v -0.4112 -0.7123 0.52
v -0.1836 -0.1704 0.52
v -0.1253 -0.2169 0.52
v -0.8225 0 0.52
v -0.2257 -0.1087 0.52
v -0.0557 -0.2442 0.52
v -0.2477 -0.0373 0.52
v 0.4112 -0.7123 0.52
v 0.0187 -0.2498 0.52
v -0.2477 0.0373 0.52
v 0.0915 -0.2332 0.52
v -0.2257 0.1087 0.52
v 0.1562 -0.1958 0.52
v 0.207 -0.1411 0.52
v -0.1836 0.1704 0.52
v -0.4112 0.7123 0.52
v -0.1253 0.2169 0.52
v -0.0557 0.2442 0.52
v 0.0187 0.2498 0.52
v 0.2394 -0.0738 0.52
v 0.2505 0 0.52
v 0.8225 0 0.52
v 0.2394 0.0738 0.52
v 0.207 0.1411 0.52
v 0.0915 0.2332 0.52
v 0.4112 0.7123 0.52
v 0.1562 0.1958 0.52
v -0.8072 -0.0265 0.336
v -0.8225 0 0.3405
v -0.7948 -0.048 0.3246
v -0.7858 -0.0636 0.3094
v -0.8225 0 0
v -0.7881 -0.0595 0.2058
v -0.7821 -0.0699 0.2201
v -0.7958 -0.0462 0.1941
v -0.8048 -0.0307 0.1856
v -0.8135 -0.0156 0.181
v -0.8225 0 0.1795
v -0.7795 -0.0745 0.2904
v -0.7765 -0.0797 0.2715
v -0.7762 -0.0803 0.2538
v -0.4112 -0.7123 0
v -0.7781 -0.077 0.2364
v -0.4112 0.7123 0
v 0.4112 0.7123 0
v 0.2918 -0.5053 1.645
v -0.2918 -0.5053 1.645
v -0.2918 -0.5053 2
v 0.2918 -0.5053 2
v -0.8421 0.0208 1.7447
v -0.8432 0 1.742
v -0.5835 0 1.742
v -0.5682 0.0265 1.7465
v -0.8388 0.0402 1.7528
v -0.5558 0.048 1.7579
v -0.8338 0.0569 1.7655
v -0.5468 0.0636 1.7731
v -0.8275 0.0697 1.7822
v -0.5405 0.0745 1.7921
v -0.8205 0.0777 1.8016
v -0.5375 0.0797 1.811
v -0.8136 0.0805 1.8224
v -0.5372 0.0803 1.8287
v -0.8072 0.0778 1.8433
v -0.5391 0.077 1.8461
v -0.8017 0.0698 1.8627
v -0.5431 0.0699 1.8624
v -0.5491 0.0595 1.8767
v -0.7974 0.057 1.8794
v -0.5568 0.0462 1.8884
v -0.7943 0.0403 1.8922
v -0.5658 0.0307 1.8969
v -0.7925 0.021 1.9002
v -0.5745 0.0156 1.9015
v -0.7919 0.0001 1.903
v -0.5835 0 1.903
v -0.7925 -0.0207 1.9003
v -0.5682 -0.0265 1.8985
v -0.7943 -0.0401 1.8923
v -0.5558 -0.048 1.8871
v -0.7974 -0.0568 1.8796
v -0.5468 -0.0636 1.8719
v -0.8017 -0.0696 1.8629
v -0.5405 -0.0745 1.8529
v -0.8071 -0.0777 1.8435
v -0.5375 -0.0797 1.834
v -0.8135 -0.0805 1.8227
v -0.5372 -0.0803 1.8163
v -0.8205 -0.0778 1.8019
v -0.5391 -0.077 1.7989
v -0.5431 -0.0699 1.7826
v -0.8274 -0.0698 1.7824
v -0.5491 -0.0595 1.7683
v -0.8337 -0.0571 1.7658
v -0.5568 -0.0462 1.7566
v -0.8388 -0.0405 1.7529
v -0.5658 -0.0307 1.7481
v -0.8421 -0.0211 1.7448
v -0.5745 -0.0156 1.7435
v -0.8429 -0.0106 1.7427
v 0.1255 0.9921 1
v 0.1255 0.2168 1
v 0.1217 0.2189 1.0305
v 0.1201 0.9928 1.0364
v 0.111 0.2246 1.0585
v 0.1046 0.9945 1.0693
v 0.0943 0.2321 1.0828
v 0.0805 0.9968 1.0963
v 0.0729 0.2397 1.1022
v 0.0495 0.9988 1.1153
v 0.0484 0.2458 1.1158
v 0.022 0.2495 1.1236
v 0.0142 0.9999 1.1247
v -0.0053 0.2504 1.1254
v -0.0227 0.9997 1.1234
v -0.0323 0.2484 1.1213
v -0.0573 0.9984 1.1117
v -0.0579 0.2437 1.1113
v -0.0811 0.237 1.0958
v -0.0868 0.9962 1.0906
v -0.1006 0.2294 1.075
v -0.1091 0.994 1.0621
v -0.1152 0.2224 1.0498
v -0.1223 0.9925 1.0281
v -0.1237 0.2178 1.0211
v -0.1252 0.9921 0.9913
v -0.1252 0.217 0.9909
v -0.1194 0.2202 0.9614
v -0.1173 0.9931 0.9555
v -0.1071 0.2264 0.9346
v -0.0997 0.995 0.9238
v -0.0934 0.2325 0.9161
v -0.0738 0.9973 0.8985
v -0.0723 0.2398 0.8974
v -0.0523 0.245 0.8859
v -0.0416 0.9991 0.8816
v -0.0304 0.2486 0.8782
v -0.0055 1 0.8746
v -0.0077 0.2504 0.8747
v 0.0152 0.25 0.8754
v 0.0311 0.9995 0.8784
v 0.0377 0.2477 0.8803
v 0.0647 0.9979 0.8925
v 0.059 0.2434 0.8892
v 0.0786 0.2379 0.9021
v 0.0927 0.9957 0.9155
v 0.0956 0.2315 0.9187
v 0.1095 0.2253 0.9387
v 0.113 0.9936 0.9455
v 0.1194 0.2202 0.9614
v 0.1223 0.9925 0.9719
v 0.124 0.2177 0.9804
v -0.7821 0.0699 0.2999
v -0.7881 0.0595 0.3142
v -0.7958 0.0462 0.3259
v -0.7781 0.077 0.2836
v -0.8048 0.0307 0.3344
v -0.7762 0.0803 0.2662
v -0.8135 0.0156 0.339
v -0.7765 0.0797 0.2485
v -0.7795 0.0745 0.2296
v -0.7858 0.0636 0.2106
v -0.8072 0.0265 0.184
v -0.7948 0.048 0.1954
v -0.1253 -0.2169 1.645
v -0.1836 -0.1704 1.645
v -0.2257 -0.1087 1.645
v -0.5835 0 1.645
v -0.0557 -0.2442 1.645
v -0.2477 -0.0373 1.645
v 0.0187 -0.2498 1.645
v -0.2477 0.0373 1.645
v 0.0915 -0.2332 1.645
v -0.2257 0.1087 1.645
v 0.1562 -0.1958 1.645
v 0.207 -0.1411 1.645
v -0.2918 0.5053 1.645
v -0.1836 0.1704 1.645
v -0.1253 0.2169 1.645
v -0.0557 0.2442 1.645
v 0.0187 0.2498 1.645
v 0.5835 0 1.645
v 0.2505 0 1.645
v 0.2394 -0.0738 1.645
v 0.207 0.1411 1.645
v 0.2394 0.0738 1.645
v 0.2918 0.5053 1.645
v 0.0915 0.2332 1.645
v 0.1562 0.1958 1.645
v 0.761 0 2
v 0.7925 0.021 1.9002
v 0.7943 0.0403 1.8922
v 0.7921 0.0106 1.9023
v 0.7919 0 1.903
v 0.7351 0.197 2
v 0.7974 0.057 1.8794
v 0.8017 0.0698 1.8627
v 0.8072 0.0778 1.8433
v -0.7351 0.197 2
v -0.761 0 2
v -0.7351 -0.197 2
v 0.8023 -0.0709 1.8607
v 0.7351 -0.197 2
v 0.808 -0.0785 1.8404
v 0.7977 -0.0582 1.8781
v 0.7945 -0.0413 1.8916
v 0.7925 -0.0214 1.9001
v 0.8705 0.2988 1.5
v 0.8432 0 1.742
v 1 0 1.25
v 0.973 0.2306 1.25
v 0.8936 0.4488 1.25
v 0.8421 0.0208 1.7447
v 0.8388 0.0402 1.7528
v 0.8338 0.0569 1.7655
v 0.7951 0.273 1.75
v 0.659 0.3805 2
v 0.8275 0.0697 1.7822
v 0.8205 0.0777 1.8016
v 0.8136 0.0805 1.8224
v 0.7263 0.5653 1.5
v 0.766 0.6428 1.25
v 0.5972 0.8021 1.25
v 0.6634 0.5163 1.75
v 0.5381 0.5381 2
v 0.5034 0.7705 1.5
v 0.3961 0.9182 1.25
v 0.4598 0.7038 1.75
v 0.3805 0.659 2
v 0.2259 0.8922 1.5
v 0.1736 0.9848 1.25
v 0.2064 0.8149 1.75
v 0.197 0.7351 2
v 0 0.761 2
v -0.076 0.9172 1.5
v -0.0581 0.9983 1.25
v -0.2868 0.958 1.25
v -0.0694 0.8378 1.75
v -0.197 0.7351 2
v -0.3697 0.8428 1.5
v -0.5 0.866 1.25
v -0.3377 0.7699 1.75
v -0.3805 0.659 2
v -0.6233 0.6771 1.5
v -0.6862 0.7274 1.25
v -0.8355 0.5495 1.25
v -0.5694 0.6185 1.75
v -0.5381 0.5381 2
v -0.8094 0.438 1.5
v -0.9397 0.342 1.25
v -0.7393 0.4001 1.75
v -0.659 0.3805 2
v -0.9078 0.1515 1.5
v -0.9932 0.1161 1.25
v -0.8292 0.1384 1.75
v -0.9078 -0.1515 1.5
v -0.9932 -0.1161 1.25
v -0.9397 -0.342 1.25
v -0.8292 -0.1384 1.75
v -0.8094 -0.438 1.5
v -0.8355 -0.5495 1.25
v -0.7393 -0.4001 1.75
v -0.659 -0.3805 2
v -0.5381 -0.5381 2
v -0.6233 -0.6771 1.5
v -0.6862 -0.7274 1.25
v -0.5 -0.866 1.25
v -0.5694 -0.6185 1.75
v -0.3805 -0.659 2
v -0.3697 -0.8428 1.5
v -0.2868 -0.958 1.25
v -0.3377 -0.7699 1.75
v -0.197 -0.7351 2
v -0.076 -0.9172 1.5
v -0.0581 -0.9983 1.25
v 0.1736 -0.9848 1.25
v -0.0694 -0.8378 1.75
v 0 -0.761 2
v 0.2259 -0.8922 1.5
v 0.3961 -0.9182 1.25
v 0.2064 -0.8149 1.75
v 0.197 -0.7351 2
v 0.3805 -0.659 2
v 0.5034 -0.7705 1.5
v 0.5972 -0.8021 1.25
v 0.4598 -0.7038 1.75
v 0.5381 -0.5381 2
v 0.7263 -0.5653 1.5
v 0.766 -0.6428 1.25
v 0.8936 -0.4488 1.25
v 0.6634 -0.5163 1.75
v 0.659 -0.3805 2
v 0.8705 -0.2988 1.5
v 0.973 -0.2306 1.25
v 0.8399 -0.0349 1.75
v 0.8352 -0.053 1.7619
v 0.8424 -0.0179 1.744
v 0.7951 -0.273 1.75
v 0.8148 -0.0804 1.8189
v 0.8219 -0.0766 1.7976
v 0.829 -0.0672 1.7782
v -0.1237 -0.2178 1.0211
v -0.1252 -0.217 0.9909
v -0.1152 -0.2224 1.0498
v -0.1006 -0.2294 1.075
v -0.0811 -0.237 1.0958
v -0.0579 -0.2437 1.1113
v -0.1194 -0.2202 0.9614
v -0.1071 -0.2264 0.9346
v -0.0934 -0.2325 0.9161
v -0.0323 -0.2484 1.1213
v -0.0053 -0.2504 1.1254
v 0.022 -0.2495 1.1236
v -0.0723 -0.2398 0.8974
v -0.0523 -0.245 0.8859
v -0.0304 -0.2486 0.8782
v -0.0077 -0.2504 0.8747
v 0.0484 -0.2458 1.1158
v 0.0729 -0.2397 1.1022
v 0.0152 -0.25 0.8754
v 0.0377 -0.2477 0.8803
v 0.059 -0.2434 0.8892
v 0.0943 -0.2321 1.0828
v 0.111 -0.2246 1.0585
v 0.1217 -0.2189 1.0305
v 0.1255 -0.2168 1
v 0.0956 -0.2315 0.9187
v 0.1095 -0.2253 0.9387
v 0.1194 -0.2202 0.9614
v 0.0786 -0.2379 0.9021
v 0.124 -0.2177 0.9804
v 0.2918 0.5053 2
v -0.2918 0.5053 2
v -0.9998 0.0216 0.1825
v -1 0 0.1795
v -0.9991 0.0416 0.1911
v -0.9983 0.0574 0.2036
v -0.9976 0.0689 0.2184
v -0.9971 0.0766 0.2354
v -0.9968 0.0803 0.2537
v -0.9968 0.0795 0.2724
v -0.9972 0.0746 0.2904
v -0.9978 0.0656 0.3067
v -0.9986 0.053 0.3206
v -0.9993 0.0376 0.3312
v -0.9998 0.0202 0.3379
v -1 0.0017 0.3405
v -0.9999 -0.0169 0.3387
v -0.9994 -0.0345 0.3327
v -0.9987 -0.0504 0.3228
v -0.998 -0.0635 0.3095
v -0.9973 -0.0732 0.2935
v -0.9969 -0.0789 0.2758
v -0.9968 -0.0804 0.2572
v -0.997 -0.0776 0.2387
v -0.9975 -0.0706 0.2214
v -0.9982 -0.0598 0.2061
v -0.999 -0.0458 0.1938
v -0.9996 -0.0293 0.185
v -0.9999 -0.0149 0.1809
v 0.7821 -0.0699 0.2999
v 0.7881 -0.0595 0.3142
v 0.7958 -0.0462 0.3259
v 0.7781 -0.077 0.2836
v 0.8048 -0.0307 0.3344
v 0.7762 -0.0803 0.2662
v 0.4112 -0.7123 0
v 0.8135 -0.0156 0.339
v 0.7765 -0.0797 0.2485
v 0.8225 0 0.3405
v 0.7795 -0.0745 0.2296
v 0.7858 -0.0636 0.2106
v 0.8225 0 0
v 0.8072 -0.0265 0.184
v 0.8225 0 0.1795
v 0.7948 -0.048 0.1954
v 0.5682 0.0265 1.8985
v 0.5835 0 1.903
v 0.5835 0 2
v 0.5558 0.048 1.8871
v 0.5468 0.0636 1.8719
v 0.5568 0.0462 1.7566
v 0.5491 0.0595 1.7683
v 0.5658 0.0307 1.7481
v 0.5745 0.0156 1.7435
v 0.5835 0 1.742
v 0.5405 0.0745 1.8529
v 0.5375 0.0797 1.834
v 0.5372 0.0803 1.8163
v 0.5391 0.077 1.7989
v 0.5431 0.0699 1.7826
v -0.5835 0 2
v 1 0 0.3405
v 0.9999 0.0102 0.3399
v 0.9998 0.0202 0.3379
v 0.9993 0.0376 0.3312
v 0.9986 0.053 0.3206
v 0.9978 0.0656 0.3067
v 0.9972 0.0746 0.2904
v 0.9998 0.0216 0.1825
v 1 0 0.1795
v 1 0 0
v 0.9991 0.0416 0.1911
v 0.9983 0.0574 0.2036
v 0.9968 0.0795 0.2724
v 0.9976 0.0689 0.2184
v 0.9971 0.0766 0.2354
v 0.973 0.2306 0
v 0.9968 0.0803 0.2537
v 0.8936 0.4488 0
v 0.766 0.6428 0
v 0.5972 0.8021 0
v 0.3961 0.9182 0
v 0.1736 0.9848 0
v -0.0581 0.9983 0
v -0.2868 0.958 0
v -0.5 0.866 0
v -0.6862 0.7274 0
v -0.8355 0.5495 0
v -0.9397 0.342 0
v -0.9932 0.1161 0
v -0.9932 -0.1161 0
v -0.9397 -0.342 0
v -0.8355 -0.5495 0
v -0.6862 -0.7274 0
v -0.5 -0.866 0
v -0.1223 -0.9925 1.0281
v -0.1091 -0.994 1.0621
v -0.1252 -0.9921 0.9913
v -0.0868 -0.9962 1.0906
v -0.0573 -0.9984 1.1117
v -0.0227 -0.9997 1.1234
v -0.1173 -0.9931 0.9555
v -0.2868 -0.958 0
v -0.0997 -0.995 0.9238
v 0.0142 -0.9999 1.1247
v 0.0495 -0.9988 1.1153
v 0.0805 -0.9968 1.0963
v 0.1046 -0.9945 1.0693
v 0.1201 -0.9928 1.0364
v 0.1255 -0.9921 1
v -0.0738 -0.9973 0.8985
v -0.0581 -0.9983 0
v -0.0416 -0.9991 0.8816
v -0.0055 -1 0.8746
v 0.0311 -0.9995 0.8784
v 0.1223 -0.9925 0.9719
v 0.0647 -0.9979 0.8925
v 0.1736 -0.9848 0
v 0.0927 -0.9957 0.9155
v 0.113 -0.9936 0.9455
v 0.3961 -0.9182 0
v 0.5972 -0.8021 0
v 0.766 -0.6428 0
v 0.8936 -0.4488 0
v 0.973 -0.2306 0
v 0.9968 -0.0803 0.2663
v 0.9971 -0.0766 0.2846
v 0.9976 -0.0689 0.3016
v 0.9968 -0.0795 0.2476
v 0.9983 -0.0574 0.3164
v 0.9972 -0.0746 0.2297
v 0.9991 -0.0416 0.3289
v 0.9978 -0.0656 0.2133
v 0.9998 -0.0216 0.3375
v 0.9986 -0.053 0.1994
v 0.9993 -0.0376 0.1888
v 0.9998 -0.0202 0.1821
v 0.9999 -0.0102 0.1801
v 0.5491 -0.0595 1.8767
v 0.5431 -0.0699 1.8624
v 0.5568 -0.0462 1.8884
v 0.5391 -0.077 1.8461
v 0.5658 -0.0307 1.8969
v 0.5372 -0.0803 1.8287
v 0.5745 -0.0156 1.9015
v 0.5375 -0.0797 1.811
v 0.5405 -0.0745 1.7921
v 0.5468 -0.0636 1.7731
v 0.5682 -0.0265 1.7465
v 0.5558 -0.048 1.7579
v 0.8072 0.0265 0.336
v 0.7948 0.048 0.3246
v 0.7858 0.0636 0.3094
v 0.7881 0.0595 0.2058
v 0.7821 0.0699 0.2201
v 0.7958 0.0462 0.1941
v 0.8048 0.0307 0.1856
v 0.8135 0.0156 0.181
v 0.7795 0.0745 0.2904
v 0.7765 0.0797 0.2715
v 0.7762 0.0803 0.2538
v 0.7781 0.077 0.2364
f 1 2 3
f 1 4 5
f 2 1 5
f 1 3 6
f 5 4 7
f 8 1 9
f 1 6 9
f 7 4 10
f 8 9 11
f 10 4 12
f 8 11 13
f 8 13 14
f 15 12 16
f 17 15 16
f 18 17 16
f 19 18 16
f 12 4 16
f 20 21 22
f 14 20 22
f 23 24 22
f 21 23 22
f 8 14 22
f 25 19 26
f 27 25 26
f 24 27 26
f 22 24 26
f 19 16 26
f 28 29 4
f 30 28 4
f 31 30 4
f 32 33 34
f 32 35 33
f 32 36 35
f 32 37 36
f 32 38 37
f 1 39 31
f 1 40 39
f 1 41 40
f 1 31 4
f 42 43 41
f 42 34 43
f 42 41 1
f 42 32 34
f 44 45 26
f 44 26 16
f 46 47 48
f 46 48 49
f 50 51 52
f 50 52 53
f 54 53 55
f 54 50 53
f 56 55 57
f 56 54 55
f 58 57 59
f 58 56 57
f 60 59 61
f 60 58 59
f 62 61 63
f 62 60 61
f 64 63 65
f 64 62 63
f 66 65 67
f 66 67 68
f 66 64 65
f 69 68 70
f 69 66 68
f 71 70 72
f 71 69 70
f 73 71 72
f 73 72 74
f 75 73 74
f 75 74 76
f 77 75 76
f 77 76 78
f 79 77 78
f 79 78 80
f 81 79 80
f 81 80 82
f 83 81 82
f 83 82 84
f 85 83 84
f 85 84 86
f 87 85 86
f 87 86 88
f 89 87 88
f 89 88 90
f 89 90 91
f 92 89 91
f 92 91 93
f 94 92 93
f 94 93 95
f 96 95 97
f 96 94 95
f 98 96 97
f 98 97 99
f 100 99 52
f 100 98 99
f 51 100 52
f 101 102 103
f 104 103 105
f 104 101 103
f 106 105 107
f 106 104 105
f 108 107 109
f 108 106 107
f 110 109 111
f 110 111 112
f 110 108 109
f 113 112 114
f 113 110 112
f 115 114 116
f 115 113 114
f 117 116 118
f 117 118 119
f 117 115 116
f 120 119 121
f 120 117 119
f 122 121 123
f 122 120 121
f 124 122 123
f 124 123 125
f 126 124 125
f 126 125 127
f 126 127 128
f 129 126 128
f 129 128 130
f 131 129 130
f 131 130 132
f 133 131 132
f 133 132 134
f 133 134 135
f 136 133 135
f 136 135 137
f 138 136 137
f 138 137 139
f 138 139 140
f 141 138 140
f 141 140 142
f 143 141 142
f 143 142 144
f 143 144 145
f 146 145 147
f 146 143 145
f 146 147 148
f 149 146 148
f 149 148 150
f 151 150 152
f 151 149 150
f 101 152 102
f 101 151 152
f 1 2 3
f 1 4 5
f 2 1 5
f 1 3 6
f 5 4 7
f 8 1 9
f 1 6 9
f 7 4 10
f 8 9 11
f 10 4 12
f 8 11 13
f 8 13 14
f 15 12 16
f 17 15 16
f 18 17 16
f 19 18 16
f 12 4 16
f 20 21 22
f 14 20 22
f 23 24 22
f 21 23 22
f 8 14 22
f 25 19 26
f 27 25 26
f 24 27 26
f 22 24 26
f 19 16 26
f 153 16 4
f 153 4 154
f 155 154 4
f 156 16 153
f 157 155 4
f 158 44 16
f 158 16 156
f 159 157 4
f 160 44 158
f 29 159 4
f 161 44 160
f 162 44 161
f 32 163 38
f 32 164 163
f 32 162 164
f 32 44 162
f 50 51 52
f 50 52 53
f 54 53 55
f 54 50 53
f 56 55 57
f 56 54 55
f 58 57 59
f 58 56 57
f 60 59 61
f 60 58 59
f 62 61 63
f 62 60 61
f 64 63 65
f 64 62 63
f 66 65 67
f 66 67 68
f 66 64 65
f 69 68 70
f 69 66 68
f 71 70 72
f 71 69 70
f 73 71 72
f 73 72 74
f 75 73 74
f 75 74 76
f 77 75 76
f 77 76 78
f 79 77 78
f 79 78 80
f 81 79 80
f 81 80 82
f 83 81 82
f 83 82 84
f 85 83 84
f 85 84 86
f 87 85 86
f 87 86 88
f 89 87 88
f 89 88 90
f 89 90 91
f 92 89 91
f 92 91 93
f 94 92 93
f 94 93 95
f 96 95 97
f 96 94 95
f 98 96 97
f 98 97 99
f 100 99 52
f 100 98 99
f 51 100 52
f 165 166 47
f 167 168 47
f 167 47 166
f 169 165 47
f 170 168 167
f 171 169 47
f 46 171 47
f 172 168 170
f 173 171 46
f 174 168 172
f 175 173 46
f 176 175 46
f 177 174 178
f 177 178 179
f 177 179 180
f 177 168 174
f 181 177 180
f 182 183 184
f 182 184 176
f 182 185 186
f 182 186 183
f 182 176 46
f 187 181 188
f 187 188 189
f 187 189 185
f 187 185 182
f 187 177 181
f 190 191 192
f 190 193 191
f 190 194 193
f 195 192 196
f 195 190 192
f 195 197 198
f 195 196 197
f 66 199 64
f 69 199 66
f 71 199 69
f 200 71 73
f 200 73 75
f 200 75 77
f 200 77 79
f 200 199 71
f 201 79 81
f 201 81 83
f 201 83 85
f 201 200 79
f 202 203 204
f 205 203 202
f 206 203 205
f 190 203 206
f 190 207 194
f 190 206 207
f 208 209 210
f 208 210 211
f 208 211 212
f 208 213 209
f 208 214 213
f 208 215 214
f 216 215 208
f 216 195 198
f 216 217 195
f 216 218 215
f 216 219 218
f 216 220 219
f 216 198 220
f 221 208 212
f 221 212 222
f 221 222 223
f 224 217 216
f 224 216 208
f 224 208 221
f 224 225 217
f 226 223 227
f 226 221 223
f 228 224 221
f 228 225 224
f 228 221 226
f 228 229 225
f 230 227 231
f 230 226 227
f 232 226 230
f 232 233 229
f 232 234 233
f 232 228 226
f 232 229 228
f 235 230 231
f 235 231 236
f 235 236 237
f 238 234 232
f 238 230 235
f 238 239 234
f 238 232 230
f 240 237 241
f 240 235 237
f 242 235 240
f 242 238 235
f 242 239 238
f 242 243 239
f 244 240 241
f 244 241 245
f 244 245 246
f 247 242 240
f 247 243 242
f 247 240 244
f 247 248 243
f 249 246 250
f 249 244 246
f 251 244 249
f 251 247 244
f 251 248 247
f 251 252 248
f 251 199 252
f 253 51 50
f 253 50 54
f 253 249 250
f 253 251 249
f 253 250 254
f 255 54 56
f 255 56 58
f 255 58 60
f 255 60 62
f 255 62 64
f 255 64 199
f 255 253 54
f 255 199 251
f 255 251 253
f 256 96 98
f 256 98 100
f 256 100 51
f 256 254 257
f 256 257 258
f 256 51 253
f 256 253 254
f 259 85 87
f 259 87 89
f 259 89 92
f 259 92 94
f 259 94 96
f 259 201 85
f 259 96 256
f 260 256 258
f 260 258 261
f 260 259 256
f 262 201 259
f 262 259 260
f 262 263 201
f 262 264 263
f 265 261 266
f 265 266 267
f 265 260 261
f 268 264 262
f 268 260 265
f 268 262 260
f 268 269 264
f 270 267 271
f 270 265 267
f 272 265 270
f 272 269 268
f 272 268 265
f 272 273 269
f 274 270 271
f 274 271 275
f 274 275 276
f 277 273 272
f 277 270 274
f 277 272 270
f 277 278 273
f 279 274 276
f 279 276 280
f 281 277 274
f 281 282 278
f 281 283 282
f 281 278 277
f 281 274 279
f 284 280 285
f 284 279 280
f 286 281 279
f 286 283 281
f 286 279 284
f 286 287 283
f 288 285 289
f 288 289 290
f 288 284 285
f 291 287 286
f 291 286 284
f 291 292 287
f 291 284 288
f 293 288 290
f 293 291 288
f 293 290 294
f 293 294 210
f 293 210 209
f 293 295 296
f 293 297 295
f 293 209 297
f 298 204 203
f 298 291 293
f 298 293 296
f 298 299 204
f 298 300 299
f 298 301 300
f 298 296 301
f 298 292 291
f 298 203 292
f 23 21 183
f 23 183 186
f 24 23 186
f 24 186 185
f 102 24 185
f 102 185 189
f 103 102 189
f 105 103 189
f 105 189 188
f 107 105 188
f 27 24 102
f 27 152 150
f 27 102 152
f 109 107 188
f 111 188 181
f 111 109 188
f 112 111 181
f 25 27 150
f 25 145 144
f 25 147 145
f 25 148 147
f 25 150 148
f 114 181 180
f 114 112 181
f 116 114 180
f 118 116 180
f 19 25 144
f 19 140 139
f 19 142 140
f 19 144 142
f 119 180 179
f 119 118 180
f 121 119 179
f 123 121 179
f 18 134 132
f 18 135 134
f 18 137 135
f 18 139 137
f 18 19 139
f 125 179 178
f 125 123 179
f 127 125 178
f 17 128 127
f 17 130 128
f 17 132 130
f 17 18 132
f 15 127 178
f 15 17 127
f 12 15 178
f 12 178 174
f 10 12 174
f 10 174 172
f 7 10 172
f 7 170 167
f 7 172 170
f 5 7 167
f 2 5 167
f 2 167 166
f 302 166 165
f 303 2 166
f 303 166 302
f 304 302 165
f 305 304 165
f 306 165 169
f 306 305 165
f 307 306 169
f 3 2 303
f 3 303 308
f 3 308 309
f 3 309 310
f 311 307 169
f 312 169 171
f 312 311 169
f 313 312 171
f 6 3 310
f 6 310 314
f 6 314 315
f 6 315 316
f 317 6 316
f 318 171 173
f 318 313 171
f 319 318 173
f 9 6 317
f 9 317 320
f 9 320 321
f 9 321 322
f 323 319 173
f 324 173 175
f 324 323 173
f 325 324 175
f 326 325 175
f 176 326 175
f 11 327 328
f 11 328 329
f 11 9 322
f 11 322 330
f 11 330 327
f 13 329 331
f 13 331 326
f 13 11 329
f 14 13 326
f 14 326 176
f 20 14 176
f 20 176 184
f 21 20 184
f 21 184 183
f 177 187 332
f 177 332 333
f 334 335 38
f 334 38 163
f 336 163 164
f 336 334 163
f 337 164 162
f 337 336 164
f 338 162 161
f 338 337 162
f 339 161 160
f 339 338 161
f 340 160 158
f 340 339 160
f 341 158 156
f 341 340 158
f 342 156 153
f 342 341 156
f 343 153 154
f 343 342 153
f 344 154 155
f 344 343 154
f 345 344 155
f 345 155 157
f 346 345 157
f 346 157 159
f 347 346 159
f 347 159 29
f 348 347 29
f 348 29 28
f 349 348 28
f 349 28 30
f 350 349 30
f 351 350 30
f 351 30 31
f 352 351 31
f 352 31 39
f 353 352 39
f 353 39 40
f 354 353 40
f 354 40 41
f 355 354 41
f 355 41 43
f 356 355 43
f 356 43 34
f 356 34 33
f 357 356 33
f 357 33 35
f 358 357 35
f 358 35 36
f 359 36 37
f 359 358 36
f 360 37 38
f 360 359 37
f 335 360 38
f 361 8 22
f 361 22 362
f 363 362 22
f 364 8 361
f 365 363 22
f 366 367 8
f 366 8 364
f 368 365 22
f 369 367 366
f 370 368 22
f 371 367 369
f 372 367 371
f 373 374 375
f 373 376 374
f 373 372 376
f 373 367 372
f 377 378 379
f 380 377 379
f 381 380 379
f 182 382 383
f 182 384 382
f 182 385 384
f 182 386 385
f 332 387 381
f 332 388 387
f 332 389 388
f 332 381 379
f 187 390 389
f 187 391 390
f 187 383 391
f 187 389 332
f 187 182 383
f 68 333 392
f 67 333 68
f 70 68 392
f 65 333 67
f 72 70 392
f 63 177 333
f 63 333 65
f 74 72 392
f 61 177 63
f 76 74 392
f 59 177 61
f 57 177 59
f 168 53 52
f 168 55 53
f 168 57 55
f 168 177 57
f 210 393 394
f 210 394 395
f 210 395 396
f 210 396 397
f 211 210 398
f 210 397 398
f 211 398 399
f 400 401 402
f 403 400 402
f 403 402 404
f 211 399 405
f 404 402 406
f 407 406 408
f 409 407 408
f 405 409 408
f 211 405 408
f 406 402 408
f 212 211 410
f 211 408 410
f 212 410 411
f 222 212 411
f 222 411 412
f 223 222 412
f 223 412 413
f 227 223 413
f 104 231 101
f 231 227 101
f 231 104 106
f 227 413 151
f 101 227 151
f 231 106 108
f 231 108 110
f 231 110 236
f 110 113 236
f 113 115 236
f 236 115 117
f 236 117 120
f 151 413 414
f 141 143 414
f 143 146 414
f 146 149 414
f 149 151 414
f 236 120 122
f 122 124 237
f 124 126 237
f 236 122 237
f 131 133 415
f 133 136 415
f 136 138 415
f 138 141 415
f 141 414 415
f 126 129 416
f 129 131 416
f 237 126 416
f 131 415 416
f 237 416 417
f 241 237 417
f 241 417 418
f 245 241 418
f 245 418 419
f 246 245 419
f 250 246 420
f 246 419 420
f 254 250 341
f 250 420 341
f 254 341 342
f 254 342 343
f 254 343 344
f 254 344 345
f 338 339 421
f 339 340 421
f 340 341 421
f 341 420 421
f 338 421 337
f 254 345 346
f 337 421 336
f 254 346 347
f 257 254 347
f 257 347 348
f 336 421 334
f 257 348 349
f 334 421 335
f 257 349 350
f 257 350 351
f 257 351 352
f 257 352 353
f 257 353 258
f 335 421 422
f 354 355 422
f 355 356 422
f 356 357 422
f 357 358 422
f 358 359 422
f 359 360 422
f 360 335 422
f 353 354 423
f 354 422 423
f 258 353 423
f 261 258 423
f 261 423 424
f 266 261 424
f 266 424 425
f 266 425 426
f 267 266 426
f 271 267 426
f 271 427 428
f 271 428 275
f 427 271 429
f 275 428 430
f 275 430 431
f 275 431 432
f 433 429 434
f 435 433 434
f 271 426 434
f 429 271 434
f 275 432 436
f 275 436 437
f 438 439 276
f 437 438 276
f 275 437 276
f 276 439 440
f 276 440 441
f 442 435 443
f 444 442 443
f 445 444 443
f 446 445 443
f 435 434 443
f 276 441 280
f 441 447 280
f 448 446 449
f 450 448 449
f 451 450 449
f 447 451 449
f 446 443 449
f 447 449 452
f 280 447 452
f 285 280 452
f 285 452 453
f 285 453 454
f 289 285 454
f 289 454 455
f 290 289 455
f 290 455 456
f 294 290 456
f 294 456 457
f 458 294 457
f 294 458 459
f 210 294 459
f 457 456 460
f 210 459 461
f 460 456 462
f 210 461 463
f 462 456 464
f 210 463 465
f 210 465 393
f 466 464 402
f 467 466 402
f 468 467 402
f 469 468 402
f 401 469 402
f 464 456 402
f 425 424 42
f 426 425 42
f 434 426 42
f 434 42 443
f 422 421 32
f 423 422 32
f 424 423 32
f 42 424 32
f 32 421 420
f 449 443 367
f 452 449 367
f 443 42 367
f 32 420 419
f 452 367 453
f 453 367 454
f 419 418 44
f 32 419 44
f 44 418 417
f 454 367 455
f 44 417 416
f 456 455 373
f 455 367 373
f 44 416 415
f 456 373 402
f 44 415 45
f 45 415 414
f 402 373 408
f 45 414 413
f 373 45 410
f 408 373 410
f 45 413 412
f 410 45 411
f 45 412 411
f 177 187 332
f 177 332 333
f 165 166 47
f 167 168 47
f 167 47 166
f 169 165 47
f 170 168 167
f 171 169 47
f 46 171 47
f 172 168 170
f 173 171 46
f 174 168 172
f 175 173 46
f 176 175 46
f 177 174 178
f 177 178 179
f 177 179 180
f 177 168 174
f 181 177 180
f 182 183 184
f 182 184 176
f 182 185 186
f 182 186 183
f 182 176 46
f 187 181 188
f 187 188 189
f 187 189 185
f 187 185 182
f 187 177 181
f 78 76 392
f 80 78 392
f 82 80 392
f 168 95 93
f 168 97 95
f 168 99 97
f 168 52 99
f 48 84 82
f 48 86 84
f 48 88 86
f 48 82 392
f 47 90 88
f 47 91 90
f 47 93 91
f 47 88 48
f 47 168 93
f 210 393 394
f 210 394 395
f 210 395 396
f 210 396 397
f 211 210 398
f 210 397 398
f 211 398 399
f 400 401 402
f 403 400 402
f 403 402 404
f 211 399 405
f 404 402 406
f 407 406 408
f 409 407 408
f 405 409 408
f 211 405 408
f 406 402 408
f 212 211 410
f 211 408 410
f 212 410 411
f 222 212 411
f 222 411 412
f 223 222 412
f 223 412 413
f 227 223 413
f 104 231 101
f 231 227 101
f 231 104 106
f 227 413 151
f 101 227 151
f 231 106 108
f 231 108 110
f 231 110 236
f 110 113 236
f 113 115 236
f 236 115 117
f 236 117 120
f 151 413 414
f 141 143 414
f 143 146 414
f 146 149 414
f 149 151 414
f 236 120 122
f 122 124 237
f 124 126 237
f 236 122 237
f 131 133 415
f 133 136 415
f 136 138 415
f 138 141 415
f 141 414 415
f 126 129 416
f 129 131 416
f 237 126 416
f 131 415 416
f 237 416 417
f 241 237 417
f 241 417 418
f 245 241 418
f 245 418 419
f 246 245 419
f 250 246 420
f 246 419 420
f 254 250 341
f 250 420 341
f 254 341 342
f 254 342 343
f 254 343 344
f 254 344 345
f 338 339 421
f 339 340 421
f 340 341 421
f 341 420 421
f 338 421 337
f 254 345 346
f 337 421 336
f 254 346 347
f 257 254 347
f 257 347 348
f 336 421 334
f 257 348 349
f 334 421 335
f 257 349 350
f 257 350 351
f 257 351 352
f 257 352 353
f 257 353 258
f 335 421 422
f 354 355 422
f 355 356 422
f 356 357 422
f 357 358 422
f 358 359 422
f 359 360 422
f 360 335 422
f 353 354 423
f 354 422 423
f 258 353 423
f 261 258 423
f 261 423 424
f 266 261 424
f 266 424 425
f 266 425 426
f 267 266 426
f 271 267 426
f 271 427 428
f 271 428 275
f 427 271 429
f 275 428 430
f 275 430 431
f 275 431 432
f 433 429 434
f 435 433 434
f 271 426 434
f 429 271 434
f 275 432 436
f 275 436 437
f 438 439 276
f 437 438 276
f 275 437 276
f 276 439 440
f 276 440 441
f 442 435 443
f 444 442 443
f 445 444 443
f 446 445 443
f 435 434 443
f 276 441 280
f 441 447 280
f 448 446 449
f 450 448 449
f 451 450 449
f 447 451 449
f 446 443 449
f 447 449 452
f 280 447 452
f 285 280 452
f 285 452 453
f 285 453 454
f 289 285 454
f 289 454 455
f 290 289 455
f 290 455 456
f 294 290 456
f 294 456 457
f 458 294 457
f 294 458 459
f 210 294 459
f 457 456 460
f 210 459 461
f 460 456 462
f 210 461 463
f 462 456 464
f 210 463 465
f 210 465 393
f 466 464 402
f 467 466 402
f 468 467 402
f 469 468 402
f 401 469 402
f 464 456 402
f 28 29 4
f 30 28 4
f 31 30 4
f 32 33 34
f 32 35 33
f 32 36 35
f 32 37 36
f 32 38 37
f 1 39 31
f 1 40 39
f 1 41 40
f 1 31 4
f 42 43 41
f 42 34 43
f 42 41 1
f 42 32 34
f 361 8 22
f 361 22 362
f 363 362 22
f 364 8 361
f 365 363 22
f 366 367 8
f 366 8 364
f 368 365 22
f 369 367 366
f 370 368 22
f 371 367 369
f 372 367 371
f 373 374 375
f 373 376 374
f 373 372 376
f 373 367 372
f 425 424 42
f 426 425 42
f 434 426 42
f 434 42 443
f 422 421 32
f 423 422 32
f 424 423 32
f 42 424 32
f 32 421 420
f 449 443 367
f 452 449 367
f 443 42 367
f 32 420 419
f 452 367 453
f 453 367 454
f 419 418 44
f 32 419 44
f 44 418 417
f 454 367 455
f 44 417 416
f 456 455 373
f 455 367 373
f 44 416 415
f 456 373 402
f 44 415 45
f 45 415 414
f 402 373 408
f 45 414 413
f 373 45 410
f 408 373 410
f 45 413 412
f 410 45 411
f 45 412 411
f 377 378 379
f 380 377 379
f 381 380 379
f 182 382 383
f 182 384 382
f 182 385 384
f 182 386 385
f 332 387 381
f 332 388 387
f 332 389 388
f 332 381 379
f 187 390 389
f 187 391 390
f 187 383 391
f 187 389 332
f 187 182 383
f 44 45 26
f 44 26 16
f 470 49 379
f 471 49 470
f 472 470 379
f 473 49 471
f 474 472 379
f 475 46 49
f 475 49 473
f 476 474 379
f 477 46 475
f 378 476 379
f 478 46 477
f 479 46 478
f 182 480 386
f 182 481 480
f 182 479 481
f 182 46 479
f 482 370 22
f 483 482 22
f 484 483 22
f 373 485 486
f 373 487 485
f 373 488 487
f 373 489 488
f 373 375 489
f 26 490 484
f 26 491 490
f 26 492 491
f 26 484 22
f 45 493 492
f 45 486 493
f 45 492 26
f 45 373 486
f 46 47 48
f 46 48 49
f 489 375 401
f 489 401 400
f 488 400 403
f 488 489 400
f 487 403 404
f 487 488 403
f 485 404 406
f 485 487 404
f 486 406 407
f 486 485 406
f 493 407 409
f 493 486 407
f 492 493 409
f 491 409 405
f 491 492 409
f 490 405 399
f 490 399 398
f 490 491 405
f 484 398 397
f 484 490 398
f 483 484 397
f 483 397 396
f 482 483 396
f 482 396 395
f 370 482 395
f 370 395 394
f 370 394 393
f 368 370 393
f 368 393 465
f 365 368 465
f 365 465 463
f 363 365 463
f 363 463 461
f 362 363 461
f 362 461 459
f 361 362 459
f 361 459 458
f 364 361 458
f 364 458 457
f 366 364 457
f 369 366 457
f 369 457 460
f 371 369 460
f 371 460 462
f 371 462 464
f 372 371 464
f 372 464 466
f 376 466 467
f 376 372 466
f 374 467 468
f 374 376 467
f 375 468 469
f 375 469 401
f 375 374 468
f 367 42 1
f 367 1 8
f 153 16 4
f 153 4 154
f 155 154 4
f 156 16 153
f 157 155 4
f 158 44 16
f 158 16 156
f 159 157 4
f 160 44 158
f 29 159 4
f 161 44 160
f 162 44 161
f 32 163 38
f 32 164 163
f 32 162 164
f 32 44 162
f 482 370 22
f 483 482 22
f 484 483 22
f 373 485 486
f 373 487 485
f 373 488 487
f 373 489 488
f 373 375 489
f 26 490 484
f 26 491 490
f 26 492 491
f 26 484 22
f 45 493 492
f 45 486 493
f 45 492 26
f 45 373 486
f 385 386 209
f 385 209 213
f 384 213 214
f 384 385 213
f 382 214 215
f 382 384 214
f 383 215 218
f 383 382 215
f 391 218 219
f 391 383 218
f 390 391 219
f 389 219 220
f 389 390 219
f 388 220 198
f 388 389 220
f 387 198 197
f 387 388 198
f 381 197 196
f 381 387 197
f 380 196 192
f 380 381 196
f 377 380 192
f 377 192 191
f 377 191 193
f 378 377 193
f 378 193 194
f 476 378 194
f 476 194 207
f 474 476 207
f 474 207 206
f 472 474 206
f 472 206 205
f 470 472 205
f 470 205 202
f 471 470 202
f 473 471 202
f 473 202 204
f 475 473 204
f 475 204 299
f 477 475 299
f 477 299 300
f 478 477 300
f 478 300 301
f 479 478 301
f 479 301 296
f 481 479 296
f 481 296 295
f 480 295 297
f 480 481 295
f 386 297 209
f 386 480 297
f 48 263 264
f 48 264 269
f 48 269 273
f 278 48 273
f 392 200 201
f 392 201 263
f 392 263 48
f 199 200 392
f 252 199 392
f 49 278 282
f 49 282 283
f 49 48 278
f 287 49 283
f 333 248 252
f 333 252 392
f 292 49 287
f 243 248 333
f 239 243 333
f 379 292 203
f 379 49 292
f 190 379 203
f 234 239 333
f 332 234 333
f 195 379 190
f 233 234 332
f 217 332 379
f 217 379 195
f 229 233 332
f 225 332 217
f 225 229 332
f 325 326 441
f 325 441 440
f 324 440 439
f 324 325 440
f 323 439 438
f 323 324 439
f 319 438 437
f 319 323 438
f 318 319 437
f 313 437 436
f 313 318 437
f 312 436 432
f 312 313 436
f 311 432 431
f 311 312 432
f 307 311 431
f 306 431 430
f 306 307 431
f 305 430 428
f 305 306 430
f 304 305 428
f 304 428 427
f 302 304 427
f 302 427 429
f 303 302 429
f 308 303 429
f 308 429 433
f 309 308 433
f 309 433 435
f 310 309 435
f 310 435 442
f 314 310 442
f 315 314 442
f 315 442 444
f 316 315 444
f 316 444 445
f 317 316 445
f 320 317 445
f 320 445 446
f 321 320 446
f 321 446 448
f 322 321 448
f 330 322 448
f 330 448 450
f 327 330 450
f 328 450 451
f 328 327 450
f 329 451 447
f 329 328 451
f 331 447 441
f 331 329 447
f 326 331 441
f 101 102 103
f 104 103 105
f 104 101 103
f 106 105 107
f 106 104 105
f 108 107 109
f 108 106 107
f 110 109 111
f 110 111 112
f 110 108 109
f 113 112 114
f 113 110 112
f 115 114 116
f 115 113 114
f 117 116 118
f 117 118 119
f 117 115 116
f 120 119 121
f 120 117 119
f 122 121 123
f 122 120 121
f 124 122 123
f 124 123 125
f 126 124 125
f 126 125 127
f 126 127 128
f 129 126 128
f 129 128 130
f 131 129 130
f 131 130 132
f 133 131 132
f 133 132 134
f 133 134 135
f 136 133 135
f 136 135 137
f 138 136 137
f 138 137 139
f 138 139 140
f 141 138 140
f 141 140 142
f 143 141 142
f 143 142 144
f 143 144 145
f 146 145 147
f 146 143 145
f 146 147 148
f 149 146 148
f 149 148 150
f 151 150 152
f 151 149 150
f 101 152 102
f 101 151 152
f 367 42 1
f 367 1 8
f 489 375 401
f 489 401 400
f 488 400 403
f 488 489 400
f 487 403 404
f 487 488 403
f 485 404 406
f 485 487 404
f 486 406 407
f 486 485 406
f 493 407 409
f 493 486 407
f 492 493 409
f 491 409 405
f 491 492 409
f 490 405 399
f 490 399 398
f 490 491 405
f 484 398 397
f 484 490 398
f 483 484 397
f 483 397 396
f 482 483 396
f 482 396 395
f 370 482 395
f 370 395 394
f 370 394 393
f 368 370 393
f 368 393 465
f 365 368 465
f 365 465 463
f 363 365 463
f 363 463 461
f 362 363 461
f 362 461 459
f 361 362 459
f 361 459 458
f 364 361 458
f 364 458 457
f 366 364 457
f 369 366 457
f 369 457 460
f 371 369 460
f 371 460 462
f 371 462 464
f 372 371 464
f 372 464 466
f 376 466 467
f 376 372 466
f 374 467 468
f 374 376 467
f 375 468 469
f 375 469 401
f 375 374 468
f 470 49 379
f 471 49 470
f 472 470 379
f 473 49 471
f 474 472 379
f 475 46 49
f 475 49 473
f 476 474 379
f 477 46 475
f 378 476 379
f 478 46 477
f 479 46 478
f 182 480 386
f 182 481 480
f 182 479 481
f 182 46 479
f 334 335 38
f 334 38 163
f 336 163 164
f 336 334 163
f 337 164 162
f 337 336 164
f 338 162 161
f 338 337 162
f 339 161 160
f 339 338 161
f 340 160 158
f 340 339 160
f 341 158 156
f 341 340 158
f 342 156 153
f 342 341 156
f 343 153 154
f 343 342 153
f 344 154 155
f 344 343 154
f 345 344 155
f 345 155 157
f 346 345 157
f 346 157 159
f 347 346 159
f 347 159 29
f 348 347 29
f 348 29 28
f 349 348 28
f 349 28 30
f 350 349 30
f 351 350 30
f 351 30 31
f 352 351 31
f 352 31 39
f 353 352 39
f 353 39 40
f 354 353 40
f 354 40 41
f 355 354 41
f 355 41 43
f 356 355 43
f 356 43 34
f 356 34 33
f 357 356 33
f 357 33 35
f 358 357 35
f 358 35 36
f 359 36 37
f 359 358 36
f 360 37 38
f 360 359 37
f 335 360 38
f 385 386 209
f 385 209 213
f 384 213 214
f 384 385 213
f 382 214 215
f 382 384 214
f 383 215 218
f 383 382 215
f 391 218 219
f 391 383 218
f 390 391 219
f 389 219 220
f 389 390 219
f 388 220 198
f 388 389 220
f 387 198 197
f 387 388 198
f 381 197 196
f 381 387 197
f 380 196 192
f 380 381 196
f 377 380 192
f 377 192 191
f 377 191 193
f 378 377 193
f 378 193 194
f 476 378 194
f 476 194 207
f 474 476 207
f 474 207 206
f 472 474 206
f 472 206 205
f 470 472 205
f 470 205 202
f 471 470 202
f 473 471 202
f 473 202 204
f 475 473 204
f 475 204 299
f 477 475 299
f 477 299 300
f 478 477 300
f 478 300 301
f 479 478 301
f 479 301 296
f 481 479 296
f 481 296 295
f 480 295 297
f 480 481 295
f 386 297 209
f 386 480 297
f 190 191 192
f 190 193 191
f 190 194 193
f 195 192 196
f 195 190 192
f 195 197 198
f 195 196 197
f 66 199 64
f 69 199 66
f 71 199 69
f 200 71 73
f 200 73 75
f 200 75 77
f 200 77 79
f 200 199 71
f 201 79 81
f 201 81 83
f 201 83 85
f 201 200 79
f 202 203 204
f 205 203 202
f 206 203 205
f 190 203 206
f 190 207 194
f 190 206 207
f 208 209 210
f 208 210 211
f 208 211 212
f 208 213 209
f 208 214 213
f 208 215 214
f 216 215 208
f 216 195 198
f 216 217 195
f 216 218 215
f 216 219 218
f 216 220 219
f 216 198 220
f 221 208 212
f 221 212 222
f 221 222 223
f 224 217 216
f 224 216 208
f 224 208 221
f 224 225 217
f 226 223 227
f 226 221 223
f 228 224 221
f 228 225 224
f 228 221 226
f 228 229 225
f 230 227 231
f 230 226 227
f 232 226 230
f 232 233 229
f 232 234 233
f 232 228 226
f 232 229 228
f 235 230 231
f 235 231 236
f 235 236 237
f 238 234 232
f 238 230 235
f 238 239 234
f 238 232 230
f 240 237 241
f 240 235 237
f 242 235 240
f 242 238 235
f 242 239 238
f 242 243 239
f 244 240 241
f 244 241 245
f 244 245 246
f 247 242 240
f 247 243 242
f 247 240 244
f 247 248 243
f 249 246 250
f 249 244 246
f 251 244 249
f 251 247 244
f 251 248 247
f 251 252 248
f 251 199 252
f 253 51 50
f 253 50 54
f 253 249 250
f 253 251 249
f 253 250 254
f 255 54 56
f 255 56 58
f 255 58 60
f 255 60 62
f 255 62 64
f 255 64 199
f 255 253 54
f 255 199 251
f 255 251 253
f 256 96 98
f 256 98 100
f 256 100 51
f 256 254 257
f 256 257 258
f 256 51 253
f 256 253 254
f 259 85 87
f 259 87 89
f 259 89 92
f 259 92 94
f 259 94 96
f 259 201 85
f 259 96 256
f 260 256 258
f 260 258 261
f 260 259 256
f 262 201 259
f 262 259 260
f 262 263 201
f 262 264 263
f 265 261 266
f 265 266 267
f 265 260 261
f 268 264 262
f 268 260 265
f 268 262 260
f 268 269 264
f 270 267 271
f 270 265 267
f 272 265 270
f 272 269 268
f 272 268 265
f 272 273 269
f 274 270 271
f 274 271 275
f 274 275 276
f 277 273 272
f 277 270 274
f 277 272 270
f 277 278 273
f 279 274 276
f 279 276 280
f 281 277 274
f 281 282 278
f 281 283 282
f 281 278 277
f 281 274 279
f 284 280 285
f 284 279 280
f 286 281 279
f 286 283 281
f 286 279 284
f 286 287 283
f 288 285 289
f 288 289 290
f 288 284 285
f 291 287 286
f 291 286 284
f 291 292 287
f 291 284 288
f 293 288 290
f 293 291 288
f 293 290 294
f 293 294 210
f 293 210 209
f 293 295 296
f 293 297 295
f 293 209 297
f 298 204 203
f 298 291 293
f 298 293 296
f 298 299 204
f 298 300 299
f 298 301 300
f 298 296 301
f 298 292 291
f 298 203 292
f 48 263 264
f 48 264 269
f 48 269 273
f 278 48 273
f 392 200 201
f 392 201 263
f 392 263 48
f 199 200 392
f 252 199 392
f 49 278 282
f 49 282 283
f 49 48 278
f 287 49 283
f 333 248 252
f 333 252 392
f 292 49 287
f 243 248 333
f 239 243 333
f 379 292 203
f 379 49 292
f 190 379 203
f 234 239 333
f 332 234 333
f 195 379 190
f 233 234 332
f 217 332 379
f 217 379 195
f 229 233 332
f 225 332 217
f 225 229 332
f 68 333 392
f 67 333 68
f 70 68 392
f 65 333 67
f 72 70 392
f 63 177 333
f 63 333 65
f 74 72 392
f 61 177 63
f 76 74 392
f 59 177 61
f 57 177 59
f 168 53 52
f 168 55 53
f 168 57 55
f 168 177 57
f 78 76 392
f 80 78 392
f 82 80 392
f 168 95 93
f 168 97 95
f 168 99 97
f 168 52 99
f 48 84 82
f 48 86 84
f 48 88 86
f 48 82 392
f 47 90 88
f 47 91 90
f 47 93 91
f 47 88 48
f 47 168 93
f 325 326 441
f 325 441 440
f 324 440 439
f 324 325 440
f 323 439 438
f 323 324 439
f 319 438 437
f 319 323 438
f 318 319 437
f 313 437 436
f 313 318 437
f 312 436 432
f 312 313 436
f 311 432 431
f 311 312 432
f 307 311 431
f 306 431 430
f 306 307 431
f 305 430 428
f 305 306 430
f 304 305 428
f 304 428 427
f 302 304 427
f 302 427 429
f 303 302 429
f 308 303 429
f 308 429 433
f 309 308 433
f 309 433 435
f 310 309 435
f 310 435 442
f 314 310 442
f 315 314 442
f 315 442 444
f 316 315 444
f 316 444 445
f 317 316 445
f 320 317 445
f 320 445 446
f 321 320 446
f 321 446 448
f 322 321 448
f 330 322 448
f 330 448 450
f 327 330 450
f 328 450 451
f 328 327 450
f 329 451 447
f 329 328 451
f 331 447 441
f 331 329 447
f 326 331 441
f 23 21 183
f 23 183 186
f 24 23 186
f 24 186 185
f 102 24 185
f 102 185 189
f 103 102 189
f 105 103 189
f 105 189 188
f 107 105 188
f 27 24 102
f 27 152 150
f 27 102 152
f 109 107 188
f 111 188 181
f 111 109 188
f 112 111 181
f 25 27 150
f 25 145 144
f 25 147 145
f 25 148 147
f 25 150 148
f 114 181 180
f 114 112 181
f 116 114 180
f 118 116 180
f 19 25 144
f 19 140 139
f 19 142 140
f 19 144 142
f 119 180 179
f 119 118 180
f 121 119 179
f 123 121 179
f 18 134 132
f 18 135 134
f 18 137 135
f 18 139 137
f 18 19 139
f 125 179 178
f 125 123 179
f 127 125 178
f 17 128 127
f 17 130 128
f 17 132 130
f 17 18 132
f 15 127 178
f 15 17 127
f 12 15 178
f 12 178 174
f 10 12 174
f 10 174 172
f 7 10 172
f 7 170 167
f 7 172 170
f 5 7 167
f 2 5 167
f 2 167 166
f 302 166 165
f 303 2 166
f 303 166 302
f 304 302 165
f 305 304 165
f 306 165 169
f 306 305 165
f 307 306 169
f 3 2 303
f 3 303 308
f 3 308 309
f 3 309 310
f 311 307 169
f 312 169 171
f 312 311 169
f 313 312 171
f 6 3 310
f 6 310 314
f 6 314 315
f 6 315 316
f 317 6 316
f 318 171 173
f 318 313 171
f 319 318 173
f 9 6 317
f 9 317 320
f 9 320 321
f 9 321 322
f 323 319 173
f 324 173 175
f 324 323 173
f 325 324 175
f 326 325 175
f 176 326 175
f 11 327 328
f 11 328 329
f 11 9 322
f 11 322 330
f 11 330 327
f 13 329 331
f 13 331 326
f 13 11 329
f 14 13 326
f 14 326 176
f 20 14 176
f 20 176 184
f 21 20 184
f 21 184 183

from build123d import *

# Parameters (mm, degrees)
PRISM_DEPTH       = 0.62
PRISM001_DEPTH    = 0.455
CYLINDER003_R     = 0.1255
CYLINDER003_DEPTH = 2.2
CYLINDER004_R     = 0.0805
CYLINDER004_DEPTH = 2.2
CYLINDER005_R     = 0.0805
CYLINDER005_DEPTH = 2.2
CYLINDER002_R     = 0.2505
CYLINDER002_DEPTH = 2.2
CYLINDER_R        = 1
CYLINDER_DEPTH    = 1.25
PRISM002_DEPTH    = 0.62
PRISM003_DEPTH    = 0.455
CYLINDER009_R     = 0.1255
CYLINDER009_DEPTH = 2.2
CYLINDER010_R     = 0.0805
CYLINDER010_DEPTH = 2.2
CYLINDER011_R     = 0.0805
CYLINDER011_DEPTH = 2.2
CYLINDER008_R     = 0.2505
CYLINDER008_DEPTH = 2.2
CYLINDER006_R     = 1
CYLINDER006_DEPTH = 1.25


with BuildPart() as prism:
    # prism → prism (new body)
    with BuildSketch(Plane.XY.offset(-0.1)):
        Polygon((0.8225, 0), (0.41125, 0.712306), (-0.41125, 0.712306), (-0.8225, 0), (-0.41125, -0.712306), (0.41125, -0.712306), align=None)
    extrude(amount=PRISM_DEPTH)


with BuildPart() as prism001:
    # prism001 → prism001 (new body)
    with BuildSketch(Plane.XY.offset(1.645)):
        Polygon((0.5835, 0), (0.29175, 0.505326), (-0.29175, 0.505326), (-0.5835, 0), (-0.29175, -0.505326), (0.29175, -0.505326), align=None)
    extrude(amount=PRISM001_DEPTH)


with BuildPart() as cylinder003:
    # cylinder003 → cylinder003 (new body)
    with BuildSketch(Plane(origin=(0, 1.1, 1), x_dir=(1, 0, 0), z_dir=(0, -1, 0))):
        Circle(CYLINDER003_R)
    extrude(amount=CYLINDER003_DEPTH)


with BuildPart() as cylinder004:
    # cylinder004 → cylinder004 (new body)
    with BuildSketch(Plane(origin=(-1.1, 0, 0.26), x_dir=(0, 0, -1), z_dir=(1, 0, 0))):
        Circle(CYLINDER004_R)
    extrude(amount=CYLINDER004_DEPTH)


with BuildPart() as cylinder005:
    # cylinder005 → cylinder005 (new body)
    with BuildSketch(Plane(origin=(-1.1, 0, 1.8225), x_dir=(0, 0, -1), z_dir=(1, 0, 0))):
        Circle(CYLINDER005_R)
    extrude(amount=CYLINDER005_DEPTH)


with BuildPart() as union001:
    # cylinder002 → cylinder002 (new body)
    with BuildSketch(Plane.XY.offset(-0.1)):
        Circle(CYLINDER002_R)
    extrude(amount=CYLINDER002_DEPTH)

    # union001: union prism, prism001, cylinder003, cylinder004, cylinder005
    add(prism.part)
    add(prism001.part)
    add(cylinder003.part)
    add(cylinder004.part)
    add(cylinder005.part)


with BuildPart() as cylinder001:
    # cylinder001 → cylinder001 (revolve)
    with BuildSketch(Plane(origin=(0, 0, 1.25), x_dir=(1, 0, 0), z_dir=(0, -1, 0))):
        Polygon((0, 0), (1, 0), (0.761, 0.75), (0, 0.75), align=None)
    revolve(axis=Axis((0, 0, 1.25), (0, 0, 1)))


with BuildPart() as difference:
    # cylinder → cylinder (new body)
    with BuildSketch(Plane.XY):
        Circle(CYLINDER_R)
    extrude(amount=CYLINDER_DEPTH)

    # union: union cylinder001
    add(cylinder001.part)

    # difference: cut union001
    add(union001.part, mode=Mode.SUBTRACT)


with BuildPart() as prism002:
    # prism002 → prism002 (new body)
    with BuildSketch(Plane.XY.offset(-0.1)):
        Polygon((0.8225, 0), (0.41125, 0.712306), (-0.41125, 0.712306), (-0.8225, 0), (-0.41125, -0.712306), (0.41125, -0.712306), align=None)
    extrude(amount=PRISM002_DEPTH)


with BuildPart() as prism003:
    # prism003 → prism003 (new body)
    with BuildSketch(Plane.XY.offset(1.645)):
        Polygon((0.5835, 0), (0.29175, 0.505326), (-0.29175, 0.505326), (-0.5835, 0), (-0.29175, -0.505326), (0.29175, -0.505326), align=None)
    extrude(amount=PRISM003_DEPTH)


with BuildPart() as cylinder009:
    # cylinder009 → cylinder009 (new body)
    with BuildSketch(Plane(origin=(0, 1.1, 1), x_dir=(1, 0, 0), z_dir=(0, -1, 0))):
        Circle(CYLINDER009_R)
    extrude(amount=CYLINDER009_DEPTH)


with BuildPart() as cylinder010:
    # cylinder010 → cylinder010 (new body)
    with BuildSketch(Plane(origin=(-1.1, 0, 0.26), x_dir=(0, 0, -1), z_dir=(1, 0, 0))):
        Circle(CYLINDER010_R)
    extrude(amount=CYLINDER010_DEPTH)


with BuildPart() as cylinder011:
    # cylinder011 → cylinder011 (new body)
    with BuildSketch(Plane(origin=(-1.1, 0, 1.8225), x_dir=(0, 0, -1), z_dir=(1, 0, 0))):
        Circle(CYLINDER011_R)
    extrude(amount=CYLINDER011_DEPTH)


with BuildPart() as union003:
    # cylinder008 → cylinder008 (new body)
    with BuildSketch(Plane.XY.offset(-0.1)):
        Circle(CYLINDER008_R)
    extrude(amount=CYLINDER008_DEPTH)

    # union003: union prism002, prism003, cylinder009, cylinder010, cylinder011
    add(prism002.part)
    add(prism003.part)
    add(cylinder009.part)
    add(cylinder010.part)
    add(cylinder011.part)


with BuildPart() as cylinder007:
    # cylinder007 → cylinder007 (revolve)
    with BuildSketch(Plane(origin=(0, 0, 1.25), x_dir=(1, 0, 0), z_dir=(0, -1, 0))):
        Polygon((0, 0), (1, 0), (0.761, 0.75), (0, 0.75), align=None)
    revolve(axis=Axis((0, 0, 1.25), (0, 0, 1)))


with BuildPart() as difference001:
    # cylinder006 → cylinder006 (new body)
    with BuildSketch(Plane.XY):
        Circle(CYLINDER006_R)
    extrude(amount=CYLINDER006_DEPTH)

    # union002: union cylinder007
    add(cylinder007.part)

    # difference001: cut union003
    add(union003.part, mode=Mode.SUBTRACT)


solid = Compound([difference.part, difference001.part])
